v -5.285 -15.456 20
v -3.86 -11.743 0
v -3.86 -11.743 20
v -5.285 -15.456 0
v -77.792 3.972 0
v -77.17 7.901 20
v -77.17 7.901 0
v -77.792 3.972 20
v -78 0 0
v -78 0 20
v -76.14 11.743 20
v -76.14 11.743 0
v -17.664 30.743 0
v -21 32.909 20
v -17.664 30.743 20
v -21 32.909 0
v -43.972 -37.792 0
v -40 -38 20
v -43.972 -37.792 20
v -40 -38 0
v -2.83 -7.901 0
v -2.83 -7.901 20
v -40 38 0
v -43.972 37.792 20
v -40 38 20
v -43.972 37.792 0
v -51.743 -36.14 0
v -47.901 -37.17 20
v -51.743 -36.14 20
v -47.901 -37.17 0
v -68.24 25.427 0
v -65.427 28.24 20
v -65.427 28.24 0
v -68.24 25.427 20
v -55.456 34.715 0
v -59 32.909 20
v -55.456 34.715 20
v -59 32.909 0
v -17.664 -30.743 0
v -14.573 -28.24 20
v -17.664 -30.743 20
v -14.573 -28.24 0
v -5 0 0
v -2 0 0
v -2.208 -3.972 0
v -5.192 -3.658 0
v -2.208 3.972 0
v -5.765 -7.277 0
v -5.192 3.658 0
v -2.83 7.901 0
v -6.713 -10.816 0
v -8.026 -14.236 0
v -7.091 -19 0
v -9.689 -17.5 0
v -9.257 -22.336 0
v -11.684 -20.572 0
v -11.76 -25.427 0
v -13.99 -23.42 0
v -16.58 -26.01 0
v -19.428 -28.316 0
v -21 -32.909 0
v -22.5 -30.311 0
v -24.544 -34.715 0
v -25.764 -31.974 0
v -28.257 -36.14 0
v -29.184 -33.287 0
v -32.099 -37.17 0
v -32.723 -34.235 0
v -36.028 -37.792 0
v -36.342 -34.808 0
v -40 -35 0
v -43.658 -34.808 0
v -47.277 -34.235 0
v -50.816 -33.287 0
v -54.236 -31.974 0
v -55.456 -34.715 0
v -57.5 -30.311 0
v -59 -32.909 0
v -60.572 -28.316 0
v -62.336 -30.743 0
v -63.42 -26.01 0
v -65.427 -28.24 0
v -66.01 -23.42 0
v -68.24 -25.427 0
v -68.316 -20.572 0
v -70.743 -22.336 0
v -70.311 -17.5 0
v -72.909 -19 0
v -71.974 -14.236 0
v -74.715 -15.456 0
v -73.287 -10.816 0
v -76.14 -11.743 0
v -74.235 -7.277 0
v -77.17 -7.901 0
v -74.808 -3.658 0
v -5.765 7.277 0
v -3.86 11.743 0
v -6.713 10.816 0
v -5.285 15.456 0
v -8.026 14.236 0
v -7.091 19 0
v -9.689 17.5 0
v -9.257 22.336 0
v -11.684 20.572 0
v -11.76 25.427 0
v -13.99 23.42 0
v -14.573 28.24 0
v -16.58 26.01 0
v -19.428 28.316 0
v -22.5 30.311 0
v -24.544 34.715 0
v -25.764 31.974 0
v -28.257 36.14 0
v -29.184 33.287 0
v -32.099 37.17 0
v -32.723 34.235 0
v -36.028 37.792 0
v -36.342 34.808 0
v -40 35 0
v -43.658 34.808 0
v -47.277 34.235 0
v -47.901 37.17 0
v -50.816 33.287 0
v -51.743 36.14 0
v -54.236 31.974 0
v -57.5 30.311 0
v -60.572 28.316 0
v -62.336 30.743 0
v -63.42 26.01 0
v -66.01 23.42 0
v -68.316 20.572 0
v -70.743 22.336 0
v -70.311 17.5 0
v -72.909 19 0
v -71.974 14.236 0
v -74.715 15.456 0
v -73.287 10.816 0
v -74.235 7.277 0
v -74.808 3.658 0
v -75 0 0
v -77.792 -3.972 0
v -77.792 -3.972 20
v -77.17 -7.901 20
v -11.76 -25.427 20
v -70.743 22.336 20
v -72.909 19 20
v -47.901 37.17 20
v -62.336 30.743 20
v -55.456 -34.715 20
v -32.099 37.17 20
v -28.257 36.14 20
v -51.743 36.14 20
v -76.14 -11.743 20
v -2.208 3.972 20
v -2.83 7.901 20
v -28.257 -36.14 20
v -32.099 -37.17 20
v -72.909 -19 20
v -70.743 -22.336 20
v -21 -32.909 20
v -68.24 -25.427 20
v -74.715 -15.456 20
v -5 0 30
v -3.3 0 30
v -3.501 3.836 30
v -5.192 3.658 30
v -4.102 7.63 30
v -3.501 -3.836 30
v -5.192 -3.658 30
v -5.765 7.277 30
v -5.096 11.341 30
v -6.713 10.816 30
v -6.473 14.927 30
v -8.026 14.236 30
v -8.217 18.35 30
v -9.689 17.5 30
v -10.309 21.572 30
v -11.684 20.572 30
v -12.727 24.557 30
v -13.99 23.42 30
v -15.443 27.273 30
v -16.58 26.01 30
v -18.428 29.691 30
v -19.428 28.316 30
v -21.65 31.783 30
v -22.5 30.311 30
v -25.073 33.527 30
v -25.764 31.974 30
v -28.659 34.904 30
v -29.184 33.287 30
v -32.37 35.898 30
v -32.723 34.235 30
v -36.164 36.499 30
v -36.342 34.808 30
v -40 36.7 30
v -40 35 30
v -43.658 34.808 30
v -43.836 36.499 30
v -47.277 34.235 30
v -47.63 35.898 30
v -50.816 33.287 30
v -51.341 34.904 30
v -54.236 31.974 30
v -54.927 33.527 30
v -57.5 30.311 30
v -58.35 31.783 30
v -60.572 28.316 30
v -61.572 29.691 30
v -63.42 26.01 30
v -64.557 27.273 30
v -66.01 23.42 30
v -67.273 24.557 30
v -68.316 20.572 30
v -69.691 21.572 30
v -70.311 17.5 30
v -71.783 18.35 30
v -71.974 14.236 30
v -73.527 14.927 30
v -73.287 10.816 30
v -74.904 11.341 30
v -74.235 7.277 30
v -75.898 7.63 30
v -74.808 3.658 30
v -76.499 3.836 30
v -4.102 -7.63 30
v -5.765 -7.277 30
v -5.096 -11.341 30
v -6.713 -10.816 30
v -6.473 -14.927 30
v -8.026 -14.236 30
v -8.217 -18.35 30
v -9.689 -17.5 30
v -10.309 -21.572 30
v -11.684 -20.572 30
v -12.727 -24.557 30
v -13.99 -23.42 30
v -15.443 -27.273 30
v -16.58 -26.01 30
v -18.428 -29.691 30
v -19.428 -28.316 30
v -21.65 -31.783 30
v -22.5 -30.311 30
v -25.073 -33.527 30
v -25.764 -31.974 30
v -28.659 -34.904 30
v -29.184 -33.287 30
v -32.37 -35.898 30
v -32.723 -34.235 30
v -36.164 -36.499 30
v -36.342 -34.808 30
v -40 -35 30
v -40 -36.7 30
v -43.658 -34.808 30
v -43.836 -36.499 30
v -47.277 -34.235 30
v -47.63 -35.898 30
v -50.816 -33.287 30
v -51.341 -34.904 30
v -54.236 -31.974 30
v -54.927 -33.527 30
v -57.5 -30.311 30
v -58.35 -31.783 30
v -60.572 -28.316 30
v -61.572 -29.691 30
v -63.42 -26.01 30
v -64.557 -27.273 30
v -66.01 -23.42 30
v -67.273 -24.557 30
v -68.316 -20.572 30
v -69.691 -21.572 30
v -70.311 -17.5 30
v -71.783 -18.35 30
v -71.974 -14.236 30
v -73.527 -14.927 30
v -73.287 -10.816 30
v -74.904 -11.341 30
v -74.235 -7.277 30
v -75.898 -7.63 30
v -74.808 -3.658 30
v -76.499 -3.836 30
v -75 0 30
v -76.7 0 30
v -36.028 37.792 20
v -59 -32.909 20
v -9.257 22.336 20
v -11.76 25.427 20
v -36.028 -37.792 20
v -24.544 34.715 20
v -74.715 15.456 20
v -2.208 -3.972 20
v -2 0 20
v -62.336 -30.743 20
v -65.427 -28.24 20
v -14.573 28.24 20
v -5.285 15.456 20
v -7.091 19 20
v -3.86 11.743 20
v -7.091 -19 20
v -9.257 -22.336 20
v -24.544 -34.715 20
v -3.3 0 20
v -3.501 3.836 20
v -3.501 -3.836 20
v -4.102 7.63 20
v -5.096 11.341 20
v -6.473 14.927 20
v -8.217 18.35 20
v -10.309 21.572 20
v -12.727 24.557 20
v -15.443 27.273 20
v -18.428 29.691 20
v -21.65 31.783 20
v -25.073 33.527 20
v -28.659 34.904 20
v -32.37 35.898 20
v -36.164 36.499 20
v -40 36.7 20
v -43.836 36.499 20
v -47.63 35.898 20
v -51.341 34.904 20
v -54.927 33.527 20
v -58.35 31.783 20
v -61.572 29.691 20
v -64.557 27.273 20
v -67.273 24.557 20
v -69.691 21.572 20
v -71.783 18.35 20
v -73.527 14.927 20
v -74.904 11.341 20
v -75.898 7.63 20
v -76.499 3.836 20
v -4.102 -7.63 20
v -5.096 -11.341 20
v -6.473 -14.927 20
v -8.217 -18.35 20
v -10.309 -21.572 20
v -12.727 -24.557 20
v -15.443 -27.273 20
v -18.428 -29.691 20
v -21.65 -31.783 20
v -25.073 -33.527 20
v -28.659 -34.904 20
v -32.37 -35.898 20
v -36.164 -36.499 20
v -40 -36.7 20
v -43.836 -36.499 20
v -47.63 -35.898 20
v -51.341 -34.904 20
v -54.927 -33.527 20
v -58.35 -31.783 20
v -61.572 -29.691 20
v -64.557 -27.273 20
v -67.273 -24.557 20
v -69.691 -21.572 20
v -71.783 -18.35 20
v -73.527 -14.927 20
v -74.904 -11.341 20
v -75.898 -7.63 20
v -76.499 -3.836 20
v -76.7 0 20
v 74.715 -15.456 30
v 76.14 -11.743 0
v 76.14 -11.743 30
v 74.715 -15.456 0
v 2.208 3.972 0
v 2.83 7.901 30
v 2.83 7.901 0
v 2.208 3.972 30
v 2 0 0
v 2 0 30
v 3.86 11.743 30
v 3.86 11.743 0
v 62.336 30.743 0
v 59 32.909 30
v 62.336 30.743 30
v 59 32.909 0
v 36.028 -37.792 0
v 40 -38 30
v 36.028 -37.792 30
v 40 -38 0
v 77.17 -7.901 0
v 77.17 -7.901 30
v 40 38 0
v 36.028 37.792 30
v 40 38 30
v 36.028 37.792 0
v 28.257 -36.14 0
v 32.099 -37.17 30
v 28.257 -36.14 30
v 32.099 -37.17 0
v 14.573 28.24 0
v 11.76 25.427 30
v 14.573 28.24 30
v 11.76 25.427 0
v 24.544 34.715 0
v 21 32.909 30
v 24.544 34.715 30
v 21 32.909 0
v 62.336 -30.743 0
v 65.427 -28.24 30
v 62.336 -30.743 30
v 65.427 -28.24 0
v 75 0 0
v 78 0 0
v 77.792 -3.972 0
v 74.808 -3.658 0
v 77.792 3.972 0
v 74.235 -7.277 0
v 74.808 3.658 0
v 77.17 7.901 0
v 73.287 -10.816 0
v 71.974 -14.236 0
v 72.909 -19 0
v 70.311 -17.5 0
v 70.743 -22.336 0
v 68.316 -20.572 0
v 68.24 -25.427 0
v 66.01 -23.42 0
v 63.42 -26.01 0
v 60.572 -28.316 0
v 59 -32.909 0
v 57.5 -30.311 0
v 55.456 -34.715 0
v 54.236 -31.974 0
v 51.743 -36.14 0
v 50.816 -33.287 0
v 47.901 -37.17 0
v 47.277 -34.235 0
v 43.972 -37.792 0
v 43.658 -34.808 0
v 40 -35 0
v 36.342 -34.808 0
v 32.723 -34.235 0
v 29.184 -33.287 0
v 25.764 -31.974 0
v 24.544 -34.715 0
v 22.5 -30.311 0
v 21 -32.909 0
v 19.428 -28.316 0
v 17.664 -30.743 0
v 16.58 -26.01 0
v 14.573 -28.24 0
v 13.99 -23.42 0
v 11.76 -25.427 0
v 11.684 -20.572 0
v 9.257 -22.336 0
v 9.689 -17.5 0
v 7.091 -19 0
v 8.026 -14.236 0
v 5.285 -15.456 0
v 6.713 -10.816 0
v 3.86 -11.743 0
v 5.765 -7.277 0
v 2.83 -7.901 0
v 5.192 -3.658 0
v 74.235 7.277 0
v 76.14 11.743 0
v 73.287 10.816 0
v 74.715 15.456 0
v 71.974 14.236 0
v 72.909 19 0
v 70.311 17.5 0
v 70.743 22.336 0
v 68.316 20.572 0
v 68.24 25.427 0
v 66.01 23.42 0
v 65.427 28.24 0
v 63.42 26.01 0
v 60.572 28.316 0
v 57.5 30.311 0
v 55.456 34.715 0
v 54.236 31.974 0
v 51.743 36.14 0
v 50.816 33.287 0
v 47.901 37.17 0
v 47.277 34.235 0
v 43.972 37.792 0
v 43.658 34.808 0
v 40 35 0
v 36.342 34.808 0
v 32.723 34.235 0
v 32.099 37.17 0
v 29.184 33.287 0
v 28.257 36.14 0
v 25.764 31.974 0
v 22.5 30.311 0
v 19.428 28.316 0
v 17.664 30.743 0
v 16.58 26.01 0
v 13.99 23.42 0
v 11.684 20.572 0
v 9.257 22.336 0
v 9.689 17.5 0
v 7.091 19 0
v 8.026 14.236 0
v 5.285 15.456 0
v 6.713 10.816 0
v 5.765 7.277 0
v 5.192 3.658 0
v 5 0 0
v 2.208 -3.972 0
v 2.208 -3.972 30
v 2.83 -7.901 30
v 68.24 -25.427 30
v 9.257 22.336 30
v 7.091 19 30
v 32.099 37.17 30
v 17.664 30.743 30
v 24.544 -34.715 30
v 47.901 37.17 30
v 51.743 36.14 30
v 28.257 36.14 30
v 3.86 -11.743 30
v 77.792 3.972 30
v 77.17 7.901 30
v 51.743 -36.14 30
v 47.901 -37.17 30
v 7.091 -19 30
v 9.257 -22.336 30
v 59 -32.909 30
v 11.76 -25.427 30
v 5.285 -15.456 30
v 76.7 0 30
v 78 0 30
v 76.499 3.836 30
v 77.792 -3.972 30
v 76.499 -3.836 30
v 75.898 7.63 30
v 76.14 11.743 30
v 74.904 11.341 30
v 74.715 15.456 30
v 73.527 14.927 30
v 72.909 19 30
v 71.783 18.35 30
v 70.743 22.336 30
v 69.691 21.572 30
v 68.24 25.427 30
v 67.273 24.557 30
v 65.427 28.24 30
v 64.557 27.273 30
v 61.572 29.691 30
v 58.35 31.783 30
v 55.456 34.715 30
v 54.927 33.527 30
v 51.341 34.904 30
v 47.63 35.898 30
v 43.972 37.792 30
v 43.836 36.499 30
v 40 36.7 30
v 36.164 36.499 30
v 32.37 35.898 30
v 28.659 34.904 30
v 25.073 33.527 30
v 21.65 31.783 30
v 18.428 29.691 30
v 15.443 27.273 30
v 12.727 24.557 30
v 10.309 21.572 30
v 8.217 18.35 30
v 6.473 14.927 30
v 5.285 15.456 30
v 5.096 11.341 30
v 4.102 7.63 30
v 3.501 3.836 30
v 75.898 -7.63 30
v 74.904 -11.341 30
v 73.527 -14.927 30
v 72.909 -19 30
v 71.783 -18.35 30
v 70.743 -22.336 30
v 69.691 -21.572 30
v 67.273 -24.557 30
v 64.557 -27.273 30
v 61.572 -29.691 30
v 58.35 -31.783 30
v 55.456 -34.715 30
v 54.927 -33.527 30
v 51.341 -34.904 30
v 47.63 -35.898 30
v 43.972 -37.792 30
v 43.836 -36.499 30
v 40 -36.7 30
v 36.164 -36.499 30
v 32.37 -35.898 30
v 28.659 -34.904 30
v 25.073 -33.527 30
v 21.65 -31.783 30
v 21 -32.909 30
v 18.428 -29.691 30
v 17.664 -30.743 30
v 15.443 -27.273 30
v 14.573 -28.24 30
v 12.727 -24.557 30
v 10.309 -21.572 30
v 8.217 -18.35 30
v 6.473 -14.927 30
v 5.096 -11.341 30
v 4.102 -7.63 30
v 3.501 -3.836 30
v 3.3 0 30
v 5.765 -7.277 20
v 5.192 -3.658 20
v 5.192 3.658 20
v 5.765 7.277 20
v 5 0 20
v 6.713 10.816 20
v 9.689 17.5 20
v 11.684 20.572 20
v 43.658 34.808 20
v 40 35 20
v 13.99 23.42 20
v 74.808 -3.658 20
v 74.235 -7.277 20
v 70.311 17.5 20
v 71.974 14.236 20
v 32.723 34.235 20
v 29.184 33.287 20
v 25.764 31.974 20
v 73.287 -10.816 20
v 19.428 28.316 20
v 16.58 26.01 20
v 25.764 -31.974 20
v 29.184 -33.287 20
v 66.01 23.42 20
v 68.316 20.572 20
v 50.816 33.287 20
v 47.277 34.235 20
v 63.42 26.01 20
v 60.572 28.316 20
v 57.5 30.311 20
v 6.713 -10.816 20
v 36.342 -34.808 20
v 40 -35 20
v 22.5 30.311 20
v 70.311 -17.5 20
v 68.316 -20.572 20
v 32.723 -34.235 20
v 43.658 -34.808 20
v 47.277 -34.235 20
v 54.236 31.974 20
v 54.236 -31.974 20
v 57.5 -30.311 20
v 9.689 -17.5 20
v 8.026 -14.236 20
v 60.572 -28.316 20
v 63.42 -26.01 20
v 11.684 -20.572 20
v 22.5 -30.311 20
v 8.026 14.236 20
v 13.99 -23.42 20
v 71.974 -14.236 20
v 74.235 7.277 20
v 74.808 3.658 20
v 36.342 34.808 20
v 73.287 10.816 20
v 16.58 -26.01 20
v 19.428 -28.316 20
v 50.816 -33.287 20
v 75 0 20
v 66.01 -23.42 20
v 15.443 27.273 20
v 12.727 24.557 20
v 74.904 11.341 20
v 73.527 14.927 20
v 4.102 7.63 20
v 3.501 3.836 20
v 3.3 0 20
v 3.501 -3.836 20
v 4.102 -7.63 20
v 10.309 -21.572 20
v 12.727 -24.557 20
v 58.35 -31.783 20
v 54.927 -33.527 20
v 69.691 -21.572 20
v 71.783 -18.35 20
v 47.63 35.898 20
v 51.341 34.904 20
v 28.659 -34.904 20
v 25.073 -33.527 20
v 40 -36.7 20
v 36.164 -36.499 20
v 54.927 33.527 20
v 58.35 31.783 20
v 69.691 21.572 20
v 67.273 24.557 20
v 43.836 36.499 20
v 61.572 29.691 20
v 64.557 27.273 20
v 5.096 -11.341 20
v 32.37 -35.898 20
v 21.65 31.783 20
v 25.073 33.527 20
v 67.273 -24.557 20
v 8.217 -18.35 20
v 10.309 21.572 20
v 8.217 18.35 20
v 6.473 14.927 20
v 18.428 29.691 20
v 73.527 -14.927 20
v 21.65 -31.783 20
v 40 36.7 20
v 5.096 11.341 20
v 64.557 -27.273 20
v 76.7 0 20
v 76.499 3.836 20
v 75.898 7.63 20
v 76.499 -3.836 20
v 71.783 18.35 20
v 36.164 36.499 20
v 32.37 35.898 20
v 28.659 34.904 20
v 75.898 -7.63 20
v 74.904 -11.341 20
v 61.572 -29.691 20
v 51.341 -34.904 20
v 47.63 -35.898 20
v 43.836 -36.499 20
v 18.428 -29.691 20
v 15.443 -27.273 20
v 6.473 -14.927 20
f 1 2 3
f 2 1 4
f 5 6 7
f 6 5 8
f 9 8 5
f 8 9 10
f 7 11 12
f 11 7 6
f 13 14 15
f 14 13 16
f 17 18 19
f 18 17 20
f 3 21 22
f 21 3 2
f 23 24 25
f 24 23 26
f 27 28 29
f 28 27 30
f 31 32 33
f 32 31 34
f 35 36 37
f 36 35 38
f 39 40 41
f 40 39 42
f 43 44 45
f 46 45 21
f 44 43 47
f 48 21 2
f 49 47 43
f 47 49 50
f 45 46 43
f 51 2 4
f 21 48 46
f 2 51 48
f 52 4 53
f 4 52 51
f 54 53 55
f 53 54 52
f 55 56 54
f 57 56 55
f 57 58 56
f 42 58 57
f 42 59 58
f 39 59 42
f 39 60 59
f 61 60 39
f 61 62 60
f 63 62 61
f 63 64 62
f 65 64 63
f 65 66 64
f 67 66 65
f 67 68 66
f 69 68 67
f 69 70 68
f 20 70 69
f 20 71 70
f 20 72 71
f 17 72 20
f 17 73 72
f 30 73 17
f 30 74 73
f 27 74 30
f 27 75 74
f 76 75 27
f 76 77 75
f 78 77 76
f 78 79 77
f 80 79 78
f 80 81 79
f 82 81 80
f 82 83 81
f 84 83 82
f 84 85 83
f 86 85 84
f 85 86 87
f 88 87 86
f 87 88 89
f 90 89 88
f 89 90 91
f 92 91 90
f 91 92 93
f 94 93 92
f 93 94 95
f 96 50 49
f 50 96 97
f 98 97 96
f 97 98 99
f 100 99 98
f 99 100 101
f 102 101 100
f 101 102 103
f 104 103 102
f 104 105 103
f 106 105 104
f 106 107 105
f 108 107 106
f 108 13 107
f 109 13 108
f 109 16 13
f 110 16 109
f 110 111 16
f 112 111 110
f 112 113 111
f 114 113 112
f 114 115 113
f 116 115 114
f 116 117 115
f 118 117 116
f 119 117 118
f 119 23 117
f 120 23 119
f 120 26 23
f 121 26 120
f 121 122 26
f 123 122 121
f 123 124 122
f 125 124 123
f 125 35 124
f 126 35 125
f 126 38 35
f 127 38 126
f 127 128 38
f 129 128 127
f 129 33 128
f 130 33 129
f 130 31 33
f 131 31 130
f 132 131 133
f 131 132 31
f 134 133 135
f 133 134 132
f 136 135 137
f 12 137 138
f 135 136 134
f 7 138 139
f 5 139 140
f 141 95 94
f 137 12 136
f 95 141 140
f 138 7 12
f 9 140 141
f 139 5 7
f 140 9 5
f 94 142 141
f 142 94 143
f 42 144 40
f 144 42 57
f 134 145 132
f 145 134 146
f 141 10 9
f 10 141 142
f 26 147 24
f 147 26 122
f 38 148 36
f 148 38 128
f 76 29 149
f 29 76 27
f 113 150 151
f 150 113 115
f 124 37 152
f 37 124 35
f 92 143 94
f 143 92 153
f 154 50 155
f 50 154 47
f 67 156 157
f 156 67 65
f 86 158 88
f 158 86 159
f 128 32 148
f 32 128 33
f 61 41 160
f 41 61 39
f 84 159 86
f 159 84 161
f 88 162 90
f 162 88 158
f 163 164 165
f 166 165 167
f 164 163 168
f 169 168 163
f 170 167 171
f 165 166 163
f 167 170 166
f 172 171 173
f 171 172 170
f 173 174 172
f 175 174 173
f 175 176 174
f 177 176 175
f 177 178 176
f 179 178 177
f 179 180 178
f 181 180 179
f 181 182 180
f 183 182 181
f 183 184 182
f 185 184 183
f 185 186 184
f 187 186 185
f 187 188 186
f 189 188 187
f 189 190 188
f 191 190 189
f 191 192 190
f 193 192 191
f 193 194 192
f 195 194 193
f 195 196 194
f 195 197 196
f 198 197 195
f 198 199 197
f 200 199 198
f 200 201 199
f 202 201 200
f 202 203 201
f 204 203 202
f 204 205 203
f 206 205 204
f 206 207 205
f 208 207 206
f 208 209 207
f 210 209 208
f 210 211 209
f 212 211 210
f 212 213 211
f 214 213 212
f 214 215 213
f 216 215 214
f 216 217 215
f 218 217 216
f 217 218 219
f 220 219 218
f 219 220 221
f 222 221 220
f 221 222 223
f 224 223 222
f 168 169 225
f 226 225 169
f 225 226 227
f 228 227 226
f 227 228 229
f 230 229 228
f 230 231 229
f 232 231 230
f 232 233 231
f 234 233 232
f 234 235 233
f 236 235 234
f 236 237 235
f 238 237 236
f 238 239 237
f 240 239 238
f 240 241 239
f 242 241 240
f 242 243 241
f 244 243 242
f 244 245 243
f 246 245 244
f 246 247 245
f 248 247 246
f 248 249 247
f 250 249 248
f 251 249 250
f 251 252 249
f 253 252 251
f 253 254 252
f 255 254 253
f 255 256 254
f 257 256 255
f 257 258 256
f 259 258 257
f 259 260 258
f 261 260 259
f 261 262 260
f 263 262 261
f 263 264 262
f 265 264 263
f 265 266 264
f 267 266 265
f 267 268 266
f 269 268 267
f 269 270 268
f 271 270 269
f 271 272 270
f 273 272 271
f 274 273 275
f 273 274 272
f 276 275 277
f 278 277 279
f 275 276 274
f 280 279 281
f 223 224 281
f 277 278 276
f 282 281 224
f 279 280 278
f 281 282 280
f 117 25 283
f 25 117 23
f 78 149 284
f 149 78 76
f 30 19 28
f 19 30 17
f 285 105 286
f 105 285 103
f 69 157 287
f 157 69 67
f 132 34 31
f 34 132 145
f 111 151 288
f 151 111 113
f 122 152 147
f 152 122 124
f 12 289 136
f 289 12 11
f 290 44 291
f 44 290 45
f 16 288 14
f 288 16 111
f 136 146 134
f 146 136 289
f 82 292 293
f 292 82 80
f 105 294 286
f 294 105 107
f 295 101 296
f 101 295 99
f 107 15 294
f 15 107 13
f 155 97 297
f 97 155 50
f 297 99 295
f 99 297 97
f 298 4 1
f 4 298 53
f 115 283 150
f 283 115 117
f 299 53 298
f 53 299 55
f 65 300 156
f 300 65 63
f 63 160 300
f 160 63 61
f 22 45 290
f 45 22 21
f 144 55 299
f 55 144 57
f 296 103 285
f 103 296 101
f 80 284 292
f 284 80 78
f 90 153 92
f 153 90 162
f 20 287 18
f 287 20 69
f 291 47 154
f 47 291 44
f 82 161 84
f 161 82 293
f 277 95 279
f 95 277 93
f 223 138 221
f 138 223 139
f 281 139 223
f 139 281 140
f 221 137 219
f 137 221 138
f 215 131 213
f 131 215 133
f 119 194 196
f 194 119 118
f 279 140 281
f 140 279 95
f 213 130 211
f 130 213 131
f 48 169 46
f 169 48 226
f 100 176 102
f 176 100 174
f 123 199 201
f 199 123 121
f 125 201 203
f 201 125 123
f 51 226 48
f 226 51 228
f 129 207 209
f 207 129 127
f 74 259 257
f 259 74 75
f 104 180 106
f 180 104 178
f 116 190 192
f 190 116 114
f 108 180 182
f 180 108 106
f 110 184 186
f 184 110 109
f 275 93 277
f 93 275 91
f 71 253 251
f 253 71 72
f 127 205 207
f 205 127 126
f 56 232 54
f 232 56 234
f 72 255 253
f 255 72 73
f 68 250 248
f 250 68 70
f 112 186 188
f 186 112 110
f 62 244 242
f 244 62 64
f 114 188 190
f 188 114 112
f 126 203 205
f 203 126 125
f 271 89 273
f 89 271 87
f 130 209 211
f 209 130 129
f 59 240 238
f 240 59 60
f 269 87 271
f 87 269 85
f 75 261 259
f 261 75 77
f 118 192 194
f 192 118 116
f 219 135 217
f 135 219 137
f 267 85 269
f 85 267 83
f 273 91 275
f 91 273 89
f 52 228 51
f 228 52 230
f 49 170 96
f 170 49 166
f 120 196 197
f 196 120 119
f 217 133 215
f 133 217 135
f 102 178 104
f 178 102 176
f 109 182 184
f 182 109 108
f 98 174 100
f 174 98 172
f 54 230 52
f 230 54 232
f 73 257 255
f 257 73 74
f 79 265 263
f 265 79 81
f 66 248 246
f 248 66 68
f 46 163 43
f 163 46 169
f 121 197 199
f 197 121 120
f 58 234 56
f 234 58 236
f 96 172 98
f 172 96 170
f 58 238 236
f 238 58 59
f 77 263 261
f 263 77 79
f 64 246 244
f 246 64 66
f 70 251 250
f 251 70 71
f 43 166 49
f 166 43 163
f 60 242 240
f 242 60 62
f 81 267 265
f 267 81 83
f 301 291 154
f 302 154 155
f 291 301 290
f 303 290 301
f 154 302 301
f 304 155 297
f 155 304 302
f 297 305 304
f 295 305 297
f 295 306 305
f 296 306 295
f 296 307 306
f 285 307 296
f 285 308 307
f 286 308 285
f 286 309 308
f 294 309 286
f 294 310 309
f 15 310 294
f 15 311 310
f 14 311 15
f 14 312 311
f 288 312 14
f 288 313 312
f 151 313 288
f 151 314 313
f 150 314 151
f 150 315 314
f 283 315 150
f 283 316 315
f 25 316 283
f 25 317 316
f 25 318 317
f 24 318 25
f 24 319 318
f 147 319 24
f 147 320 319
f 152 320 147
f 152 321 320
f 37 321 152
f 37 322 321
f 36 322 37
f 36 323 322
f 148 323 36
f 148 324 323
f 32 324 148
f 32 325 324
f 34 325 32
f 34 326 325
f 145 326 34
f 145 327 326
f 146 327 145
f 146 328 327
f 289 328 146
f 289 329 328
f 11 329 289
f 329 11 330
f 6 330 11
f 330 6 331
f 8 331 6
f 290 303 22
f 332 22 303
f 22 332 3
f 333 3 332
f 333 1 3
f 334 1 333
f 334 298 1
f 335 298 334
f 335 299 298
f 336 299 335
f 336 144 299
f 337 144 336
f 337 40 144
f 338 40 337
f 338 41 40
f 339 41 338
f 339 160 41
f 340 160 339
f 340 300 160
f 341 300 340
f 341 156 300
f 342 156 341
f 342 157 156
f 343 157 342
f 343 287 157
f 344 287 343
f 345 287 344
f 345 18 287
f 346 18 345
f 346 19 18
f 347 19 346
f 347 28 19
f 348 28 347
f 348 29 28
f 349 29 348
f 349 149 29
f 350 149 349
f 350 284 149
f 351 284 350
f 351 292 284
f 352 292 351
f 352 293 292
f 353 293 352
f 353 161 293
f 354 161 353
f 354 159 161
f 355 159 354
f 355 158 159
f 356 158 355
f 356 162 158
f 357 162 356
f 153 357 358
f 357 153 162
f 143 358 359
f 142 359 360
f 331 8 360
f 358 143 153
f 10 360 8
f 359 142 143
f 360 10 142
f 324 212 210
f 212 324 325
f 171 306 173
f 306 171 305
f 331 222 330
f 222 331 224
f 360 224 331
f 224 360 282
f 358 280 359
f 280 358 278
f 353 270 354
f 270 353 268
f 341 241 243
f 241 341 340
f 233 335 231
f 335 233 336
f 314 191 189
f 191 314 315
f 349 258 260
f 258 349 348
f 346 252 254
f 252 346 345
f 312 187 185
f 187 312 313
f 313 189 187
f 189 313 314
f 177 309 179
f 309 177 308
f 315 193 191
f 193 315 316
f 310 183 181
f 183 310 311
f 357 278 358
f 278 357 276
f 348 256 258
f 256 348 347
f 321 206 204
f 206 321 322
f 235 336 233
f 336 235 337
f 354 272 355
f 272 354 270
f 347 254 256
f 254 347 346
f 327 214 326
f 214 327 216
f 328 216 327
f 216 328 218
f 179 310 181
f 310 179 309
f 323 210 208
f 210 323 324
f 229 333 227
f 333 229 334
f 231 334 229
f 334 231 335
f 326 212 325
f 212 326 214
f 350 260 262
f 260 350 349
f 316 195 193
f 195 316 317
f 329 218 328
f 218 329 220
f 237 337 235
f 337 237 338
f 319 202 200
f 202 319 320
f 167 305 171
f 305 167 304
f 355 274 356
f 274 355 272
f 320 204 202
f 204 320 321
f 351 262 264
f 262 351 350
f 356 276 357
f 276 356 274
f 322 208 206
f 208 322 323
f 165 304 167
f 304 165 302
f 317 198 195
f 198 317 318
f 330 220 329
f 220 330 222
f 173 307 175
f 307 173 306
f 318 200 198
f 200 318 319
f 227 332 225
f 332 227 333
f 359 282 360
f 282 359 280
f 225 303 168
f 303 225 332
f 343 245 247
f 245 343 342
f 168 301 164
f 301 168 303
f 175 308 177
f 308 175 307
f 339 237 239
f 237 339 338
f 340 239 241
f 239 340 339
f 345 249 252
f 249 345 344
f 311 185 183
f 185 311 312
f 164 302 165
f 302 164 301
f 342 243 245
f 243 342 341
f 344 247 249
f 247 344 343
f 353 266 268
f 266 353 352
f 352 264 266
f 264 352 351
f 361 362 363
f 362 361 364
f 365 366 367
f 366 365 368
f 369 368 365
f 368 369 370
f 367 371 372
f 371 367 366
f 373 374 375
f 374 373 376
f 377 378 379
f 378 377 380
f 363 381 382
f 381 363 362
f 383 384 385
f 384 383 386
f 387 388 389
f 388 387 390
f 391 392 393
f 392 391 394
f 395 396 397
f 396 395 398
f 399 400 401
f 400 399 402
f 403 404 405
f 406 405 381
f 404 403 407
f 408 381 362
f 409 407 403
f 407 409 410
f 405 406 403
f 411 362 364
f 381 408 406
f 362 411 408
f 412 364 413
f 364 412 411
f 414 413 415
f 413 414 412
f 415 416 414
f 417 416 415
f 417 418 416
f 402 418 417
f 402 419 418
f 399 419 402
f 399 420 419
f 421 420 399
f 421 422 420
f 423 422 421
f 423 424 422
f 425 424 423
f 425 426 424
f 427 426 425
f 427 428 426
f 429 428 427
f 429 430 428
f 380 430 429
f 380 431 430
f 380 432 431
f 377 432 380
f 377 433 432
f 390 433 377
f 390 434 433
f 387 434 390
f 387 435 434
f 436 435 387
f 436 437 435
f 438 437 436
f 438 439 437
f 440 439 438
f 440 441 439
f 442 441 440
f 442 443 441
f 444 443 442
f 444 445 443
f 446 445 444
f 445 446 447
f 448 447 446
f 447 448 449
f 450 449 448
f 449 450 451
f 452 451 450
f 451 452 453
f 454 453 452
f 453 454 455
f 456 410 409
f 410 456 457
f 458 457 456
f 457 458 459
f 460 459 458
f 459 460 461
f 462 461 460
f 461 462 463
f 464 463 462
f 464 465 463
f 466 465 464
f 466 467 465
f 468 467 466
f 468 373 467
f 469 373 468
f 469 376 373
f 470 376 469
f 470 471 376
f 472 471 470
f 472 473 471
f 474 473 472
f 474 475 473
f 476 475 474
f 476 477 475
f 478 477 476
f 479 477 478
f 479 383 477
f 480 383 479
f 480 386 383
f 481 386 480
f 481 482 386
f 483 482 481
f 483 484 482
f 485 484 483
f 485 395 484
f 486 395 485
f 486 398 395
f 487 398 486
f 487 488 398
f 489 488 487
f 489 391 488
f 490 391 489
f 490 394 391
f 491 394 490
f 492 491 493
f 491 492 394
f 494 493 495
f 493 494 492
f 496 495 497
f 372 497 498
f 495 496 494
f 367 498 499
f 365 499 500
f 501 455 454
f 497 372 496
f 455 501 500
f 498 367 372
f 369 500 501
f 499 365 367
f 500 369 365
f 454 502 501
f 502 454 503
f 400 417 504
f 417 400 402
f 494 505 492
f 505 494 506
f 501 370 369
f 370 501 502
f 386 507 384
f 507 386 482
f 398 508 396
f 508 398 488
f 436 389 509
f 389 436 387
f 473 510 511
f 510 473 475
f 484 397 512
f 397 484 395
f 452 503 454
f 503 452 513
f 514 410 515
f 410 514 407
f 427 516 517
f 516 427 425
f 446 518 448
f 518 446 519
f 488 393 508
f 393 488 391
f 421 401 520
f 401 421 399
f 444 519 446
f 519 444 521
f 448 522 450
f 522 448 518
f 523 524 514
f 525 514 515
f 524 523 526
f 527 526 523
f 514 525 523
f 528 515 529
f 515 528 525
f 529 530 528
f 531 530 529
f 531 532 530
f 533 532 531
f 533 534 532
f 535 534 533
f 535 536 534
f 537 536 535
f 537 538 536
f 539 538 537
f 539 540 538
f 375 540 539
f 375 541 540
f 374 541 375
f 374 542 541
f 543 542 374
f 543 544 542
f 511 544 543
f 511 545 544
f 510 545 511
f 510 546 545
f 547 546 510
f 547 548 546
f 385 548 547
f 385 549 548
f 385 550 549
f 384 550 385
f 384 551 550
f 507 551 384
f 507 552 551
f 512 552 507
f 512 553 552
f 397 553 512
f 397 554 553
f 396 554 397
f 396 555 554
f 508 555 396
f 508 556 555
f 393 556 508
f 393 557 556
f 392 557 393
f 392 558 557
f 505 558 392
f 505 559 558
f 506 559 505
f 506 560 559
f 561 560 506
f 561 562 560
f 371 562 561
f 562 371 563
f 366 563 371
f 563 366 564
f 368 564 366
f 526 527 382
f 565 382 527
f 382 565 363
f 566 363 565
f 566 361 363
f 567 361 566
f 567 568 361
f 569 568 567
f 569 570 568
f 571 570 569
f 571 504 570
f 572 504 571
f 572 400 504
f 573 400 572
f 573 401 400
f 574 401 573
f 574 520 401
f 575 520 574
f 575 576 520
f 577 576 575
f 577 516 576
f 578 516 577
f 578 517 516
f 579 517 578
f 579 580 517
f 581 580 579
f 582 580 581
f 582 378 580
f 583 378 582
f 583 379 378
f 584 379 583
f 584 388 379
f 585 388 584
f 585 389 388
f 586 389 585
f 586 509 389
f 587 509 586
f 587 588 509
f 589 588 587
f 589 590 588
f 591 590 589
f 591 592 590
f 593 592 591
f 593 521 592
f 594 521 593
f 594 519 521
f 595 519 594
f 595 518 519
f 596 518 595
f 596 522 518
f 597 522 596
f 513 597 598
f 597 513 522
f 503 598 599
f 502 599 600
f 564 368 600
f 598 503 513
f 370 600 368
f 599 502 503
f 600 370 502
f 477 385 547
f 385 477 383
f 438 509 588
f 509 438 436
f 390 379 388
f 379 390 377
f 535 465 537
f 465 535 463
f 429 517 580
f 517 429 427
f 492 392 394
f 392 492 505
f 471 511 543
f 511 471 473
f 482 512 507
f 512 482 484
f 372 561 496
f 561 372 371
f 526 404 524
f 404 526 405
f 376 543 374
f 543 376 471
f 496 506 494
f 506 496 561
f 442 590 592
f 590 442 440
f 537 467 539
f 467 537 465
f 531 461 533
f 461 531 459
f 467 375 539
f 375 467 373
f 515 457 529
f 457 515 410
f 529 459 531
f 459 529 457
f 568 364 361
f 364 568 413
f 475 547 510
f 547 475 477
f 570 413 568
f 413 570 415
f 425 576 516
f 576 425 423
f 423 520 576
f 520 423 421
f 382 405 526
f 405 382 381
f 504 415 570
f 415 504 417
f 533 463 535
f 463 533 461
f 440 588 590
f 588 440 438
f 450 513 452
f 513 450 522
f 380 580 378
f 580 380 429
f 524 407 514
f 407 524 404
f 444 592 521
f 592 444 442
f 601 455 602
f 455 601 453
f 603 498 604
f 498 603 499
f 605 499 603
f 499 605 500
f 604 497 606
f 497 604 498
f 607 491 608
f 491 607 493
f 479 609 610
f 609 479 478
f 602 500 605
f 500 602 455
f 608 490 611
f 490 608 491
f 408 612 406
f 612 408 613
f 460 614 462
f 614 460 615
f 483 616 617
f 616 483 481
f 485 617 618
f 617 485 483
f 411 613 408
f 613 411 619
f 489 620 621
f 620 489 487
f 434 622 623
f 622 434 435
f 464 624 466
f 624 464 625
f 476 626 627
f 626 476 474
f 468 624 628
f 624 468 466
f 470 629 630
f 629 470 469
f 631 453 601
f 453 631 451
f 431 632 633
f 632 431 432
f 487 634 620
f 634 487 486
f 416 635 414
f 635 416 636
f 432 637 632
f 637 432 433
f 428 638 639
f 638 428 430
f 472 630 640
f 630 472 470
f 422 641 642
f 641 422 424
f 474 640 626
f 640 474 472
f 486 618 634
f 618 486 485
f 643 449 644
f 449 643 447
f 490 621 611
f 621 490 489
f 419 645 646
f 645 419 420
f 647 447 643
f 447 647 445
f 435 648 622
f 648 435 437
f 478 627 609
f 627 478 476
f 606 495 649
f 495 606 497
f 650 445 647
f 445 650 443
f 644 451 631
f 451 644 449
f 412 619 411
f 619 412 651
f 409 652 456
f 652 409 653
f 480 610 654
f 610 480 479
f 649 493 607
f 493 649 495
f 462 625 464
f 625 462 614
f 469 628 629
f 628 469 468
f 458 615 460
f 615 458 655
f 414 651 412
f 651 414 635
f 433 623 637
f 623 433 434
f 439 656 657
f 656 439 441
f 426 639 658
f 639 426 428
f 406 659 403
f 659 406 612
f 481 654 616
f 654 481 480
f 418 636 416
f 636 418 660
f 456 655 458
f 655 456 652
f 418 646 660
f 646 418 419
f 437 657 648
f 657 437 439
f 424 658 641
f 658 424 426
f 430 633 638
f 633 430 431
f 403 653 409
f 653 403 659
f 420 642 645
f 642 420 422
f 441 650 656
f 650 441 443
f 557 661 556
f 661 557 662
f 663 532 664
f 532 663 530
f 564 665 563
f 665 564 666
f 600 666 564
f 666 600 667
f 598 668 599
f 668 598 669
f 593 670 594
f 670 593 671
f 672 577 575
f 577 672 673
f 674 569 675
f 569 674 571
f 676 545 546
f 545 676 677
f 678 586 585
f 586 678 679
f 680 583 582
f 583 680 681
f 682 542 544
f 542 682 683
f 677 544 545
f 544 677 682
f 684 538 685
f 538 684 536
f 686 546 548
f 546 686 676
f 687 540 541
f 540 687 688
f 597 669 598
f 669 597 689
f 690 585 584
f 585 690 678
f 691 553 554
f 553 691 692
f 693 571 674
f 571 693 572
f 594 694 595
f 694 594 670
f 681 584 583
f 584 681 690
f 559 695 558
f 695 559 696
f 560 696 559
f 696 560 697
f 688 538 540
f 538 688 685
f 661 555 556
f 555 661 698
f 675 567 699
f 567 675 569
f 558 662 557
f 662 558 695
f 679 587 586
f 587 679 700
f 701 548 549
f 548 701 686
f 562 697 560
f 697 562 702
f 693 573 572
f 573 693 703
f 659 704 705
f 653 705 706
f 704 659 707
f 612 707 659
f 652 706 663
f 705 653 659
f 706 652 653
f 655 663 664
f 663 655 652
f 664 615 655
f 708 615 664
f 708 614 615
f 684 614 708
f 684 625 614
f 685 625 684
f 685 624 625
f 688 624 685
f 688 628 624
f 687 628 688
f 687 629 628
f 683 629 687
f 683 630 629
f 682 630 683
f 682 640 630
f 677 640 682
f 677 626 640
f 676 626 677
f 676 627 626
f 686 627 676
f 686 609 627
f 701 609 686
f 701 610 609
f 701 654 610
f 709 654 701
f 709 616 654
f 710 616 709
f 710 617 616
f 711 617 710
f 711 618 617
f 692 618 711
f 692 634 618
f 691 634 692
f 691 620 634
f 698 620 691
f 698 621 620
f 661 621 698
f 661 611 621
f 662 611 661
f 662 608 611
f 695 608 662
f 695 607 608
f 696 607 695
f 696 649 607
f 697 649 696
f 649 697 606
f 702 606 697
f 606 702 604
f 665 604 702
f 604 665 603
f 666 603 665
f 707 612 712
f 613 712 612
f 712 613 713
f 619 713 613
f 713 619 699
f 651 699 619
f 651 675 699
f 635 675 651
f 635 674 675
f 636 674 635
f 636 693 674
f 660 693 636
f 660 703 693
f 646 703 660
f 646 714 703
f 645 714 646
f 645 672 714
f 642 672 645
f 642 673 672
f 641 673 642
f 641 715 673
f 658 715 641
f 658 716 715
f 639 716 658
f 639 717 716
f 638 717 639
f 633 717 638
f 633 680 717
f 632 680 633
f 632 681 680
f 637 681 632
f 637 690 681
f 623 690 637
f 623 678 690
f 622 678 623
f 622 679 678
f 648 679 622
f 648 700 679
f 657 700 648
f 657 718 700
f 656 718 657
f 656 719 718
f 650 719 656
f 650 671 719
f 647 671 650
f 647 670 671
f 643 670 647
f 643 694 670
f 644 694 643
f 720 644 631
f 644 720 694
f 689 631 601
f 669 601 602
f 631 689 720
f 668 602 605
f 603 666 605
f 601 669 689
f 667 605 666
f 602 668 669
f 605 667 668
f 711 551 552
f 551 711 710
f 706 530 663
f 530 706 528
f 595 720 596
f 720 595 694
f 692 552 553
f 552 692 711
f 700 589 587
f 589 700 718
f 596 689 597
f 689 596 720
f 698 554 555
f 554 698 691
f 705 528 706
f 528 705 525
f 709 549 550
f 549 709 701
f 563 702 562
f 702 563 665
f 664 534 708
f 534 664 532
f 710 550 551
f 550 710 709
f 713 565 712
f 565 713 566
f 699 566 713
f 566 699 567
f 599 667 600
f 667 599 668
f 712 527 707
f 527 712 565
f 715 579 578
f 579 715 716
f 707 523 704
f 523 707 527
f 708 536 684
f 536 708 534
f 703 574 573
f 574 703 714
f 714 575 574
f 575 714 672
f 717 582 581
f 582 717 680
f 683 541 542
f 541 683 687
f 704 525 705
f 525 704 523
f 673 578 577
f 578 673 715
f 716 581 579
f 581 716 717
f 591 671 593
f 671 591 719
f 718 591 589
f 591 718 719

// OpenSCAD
// Round Casting Form by Willie Beckmann 2016
//
heightoverall=50; // height over all mm - change to your needs, not < 20
diameter=70; // diameter mm - change to your needs
//
tolerance=0.2; // change accordingly to your printer
height=heightoverall+10;
wandstaerke=3; // normaly no need to change
wandhalb=wandstaerke/2+tolerance; // do not change

// Ring1
rotate([0,180,0]) {
translate([diameter/2+5,0,-height/2]) {
        difference() {
            difference() {
                cylinder(height/2,diameter/2+wandstaerke,diameter/2+wandstaerke,$fn=60);
                cylinder(height/2+1,diameter/2,diameter/2,$fn=60);
                         }
            difference() {   
                cylinder(10,diameter/2+wandstaerke,diameter/2+wandstaerke,$fn=60);
                cylinder(11,diameter/2+wandhalb,diameter/2+wandhalb,$fn=60);
                         }
                      }
                    }
            }


// Ring2
rotate([0,180,0]) {
translate([-diameter/2-5,0,-height/2]) {
        difference() {
            difference() {
                cylinder(height/2,diameter/2+wandstaerke,diameter/2+wandstaerke,$fn=60);
                cylinder(height/2+1,diameter/2,diameter/2,$fn=60);
                         }
            difference() {   
                cylinder(10,diameter/2+wandhalb,diameter/2+wandhalb,$fn=60);
                cylinder(11,diameter/2,diameter/2,$fn=60);
                         }
                      }
                    }
            }
